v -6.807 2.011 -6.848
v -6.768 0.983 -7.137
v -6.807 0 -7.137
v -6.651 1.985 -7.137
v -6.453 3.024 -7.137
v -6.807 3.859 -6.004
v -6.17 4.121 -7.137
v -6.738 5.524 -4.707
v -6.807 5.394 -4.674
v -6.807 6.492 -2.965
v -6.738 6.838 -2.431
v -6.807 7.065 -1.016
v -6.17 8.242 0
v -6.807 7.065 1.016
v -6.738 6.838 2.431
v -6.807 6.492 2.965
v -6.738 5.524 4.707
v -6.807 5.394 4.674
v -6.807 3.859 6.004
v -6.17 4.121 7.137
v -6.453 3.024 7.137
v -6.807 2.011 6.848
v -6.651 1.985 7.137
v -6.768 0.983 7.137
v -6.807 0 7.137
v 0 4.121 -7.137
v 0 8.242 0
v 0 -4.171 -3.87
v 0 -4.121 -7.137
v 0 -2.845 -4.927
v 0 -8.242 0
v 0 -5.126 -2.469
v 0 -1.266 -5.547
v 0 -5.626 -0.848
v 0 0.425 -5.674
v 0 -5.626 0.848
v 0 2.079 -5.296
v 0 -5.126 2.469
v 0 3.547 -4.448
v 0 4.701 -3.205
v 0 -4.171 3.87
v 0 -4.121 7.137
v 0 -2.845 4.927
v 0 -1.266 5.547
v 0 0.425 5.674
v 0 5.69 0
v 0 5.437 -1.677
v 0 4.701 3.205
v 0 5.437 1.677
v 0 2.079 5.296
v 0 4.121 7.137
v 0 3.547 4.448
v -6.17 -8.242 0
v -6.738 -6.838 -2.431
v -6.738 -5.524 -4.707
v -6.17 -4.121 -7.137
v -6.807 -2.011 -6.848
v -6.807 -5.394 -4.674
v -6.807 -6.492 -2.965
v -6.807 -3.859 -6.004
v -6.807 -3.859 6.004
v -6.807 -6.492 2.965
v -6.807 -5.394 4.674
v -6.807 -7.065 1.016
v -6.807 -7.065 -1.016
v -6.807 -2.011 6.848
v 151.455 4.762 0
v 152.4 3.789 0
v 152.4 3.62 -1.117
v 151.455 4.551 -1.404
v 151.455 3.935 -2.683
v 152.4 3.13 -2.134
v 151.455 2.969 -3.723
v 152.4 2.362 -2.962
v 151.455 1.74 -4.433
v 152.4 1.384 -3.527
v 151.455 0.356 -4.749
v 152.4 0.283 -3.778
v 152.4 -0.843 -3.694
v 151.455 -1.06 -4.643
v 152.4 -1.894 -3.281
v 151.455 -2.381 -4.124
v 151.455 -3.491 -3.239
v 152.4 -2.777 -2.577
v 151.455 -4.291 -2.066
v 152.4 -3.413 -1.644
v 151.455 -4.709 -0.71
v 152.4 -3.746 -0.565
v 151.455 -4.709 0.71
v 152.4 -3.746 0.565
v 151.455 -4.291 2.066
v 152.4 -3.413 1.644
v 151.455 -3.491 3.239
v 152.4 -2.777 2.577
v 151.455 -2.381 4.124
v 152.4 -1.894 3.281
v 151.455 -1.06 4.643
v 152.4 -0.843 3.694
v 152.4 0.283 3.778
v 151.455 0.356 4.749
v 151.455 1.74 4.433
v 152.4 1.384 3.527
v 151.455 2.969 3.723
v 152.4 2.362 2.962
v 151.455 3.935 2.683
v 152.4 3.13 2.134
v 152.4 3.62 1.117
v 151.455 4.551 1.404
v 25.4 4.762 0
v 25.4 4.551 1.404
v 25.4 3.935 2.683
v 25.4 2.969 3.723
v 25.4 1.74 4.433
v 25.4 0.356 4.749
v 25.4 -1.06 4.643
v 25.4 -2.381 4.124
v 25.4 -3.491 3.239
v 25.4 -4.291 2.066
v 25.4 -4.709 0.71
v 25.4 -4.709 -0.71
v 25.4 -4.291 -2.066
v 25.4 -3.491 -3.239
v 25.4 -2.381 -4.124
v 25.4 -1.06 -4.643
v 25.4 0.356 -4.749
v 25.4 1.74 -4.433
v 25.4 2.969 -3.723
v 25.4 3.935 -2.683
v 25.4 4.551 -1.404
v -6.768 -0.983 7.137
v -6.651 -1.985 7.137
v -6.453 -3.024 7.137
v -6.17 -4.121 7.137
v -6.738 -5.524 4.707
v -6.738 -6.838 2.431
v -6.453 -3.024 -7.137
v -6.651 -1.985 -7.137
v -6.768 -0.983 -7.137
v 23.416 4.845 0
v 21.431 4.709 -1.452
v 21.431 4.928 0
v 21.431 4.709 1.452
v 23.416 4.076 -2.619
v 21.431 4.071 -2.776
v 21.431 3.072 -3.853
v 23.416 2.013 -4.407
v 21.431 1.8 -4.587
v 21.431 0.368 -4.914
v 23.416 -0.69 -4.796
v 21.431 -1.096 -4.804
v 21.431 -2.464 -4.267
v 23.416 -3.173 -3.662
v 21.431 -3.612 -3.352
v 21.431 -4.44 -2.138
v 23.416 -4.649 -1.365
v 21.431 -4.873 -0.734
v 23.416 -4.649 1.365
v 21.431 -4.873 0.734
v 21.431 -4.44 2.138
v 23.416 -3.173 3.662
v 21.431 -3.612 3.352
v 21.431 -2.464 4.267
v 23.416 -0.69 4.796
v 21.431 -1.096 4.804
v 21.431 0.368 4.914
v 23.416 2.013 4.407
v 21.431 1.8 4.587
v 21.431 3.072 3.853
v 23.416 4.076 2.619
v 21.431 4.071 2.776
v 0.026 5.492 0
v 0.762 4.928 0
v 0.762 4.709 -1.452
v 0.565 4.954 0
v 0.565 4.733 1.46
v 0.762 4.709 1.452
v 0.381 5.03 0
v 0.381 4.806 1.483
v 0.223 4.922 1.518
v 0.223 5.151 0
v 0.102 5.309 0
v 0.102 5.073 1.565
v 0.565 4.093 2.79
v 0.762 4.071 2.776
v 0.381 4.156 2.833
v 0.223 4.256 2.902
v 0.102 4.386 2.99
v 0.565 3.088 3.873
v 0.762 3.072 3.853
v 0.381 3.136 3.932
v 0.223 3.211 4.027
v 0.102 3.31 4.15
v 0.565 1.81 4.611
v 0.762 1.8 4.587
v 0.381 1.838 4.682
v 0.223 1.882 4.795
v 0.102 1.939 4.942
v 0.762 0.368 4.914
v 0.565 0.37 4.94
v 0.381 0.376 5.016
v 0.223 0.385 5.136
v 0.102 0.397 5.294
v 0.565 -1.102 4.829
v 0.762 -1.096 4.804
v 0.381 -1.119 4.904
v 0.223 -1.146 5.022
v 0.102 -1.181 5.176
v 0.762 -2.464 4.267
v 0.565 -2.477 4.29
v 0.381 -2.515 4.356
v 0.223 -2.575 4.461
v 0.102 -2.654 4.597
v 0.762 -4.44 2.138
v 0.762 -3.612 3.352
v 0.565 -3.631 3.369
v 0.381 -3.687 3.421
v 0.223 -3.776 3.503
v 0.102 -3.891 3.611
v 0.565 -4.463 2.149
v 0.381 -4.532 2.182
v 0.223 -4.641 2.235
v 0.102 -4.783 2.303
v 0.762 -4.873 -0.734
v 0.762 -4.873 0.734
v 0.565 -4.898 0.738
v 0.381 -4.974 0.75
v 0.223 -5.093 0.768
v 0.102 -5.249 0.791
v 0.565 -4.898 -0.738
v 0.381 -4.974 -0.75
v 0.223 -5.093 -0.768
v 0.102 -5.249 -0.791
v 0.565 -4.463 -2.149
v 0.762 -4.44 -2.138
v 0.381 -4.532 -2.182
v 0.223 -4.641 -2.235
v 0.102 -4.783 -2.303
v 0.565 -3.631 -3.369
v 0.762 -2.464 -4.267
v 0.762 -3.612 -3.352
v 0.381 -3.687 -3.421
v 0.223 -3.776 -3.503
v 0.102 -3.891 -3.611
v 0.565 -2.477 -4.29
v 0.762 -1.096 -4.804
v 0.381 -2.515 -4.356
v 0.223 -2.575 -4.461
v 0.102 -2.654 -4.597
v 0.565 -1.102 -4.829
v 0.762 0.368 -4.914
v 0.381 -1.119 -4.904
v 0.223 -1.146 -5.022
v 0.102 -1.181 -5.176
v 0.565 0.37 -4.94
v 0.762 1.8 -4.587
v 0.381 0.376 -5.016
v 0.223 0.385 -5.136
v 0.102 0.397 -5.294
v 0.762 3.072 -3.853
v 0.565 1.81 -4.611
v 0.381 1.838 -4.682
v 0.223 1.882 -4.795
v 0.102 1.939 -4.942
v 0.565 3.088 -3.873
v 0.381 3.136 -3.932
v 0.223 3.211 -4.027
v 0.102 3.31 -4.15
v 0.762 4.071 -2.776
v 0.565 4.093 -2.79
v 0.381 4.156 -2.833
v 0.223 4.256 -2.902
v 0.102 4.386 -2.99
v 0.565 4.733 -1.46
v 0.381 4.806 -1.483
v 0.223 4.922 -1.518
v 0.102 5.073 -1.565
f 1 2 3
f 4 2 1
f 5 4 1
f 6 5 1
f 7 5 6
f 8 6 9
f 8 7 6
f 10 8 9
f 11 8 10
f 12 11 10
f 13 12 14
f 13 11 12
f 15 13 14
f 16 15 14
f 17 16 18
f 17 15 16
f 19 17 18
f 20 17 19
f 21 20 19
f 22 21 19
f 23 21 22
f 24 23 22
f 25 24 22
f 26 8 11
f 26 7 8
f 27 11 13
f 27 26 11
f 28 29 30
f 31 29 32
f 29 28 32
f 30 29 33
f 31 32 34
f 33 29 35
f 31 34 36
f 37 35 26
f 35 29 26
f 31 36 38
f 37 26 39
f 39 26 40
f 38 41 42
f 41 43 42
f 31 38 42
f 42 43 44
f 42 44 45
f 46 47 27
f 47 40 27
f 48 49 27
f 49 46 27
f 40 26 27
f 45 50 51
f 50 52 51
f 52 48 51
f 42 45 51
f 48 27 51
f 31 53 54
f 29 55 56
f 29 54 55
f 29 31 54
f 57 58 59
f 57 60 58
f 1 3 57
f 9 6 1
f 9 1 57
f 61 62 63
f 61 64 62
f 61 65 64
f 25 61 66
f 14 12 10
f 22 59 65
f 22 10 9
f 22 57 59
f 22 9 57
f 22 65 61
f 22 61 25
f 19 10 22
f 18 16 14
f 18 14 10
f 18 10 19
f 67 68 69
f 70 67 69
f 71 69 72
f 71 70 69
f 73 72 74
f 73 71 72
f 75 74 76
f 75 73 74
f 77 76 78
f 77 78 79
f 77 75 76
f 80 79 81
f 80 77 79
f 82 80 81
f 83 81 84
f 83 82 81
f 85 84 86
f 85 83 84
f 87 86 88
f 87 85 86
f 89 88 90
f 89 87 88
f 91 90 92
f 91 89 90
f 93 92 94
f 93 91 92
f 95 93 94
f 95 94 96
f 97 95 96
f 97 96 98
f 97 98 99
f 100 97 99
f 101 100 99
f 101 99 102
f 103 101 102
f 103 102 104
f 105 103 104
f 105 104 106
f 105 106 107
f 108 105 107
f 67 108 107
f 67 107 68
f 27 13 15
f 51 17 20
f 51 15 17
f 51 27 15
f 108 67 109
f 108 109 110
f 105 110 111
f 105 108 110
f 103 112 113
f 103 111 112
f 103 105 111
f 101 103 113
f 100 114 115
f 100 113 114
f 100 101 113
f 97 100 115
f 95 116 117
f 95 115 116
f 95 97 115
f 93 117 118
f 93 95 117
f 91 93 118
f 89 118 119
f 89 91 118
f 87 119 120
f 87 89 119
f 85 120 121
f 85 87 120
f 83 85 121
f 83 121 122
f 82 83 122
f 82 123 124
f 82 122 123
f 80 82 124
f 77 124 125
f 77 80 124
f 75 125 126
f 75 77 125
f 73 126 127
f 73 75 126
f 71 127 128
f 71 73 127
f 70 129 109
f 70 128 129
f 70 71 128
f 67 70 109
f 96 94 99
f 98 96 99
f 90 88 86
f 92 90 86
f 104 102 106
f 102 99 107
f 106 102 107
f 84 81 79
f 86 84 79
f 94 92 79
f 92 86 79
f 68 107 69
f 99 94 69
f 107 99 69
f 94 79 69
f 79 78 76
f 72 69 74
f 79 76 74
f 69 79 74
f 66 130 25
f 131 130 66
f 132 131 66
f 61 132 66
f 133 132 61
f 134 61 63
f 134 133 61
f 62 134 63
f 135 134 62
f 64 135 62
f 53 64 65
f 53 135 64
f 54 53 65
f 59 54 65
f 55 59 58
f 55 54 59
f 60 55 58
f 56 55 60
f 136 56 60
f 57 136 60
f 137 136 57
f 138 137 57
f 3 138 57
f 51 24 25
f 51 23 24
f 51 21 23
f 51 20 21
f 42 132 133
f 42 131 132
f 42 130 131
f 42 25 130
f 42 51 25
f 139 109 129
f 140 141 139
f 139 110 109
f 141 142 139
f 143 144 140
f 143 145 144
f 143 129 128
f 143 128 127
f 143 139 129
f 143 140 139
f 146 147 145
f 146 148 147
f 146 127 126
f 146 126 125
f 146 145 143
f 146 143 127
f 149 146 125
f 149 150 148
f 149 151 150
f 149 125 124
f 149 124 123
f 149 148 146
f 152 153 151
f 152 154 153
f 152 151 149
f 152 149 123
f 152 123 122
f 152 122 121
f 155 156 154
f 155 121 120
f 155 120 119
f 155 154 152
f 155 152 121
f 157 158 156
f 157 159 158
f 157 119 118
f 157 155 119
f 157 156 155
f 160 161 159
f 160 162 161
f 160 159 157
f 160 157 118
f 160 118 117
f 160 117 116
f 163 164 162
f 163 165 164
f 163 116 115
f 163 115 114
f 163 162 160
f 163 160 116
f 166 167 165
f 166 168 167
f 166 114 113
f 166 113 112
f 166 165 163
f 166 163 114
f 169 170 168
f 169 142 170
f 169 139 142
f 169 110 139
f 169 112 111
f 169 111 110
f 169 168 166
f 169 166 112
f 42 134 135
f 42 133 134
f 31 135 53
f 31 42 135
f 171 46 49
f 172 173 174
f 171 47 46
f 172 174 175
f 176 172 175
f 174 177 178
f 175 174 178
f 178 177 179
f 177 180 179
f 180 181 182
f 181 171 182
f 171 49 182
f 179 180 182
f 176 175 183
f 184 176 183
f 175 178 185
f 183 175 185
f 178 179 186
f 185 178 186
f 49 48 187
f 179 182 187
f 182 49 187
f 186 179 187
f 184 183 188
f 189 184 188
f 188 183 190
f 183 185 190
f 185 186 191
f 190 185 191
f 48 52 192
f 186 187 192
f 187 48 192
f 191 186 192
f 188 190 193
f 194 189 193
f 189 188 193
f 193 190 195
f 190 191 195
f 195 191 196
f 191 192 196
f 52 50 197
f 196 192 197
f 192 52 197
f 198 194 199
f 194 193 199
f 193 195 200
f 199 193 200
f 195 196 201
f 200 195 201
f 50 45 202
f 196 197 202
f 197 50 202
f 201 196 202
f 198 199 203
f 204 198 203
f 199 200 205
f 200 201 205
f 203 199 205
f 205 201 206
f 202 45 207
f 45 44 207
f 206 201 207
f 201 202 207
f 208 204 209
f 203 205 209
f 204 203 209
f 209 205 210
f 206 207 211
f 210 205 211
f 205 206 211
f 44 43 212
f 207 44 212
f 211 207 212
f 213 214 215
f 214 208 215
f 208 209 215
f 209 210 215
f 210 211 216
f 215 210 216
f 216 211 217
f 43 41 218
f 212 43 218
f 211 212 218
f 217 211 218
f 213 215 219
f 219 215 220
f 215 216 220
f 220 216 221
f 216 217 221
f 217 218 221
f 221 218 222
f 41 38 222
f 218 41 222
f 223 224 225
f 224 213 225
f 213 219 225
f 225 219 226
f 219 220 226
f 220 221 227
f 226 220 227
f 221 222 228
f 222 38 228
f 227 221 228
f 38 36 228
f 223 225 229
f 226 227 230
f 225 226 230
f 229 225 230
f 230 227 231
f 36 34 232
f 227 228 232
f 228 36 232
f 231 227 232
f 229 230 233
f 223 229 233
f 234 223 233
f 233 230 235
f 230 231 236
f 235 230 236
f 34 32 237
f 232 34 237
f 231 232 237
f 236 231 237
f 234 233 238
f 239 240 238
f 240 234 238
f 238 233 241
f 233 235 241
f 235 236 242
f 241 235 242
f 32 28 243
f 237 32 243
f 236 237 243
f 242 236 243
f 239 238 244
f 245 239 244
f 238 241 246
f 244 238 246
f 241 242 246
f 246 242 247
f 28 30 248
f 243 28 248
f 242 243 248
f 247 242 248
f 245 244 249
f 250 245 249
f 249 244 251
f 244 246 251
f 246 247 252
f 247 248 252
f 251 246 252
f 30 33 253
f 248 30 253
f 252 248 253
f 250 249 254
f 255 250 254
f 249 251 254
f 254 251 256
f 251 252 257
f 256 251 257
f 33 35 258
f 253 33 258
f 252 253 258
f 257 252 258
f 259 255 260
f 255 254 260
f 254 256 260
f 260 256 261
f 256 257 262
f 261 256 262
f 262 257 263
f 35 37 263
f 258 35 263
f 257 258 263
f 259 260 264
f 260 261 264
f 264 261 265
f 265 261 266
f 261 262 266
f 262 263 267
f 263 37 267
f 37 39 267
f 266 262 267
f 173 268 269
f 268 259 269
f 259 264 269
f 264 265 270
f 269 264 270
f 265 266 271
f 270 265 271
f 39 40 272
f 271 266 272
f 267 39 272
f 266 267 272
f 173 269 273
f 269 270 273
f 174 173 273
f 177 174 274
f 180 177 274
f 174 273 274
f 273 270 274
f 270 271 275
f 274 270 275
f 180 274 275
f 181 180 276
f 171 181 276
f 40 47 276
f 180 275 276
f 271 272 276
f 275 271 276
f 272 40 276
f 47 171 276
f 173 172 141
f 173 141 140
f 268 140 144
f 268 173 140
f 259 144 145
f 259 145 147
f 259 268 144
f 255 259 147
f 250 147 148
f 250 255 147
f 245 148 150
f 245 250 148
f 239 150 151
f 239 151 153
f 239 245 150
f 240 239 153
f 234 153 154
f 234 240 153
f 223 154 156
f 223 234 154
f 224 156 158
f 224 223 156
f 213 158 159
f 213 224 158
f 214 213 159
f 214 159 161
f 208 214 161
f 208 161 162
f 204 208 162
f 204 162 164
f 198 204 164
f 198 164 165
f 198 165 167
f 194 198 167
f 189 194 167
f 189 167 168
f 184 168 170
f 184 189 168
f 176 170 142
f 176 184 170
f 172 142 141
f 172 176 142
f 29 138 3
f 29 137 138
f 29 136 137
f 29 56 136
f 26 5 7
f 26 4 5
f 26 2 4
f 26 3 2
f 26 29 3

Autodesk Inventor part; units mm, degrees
ref_plane "YZ Plane" through (0, 0, 0) normal (1, 0, 0) x (0, 1, 0)
ref_plane "XZ Plane" through (0, 0, 0) normal (0, 1, 0) x (-1, 0, 0)
sketch "Sketch1" plane through (0, 0, 0) normal (0, 0, 1) x (1, 0, 0)
  line L0 (0, 7.1374) -> (0, 4.9276)
  line L1 (25.4, 4.7625) -> (152.4, 4.7625)
  line L2 (152.4, 4.7625) -> (152.4, 0)
  line L3 (152.4, 0) -> (-0.0001, 0)
  line L4 (-30.4801, 0) -> (182.88, 0) projected
  line L5 (-0.0001, 0) -> (-0.0001, 7.1374)
  line L6 (-0.0001, 7.1374) -> (0, 7.1374)
  line L7 (25.4, 4.7625) -> (21.4311, 4.9276)
  line L8 (21.4311, 4.9276) -> (0, 4.9276)
  line L9 (0, -1.4275) -> (0, 8.5649) projected
  dimension "d0" = 152.4
  dimension "d1" = 127
revolve "Body" add sketch "Sketch1" angle 360 about axis through (152.4, 0, 0) along (-1, 0, 0)
sketch "Sketch2" plane through (-0.0001, 0, 0) normal (-1, 0, 0) x (0, 0, 1)
  line L0 (0, 8.2416) -> (7.1374, 4.1208)
  line L1 (7.1374, 4.1208) -> (7.1374, -4.1208)
  line L2 (7.1374, -4.1208) -> (0, -8.2416)
  line L3 (0, -8.2416) -> (-7.1374, -4.1208)
  line L4 (-7.1374, -4.1208) -> (-7.1374, 4.1208)
  line L5 (-7.1374, 4.1208) -> (0, 8.2416)
  point P0 (0, 0)
  point P1 (0, 0)
  dimension "d11" = 14.2748
extrude "Head" add sketch "Sketch2" along normal blind 6.8072
sketch "Sketch4" plane through (0, 0, 0) normal (0, 0, 1) x (1, 0, 0)
  line L0 (-6.8073, 7.1374) -> (-6.8073, 8.2416)
  line L1 (-6.8073, 8.2416) -> (-6.1698, 8.2416)
  line L2 (-6.1698, 8.2416) -> (-6.8073, 7.1374)
  line L3 (-8.1687, 0) -> (1.3613, 0) projected
  line L4 (-0.0001, 8.2416) -> (-6.8073, 8.2416) projected
  line L5 (-6.8073, 4.1208) -> (-6.8073, 8.2416) projected
  dimension "d5" = 30
  dimension "d19" = 14.2748
revolve "Chamfer1" cut sketch "Sketch4" angle 360 about axis through (-10, 0, 0) along (1, 0, 0)
thread "Thread" size "3/8-16 UNC" class "2A" standard "ANSI Unified Screw Threads" full length
chamfer "Chamfer2" distance 0.9739 distance2 0.9447 1 edges at (152.4, -4.7625, 0) measured on face at (152.4, -0.1914, 1.3928)
ref_plane "Work Plane1" through (1.525, 0, 0) normal (0, 0, 1) x (1, 0, 0)
fillet "Fillet2" radius 0.762 1 edges at (0, -4.9276, 0)
equation "\"d63\" = R"
equation "\"d11\" = SW"
equation "\"d3\" = KOH - SD"
equation "\"d15\" = GEL"
equation "\"d6\" = -0.5 * SPD + 0.5 * GD"
equation "\"d5\" = ANG1"
equation "\"d19\" = SW0"
equation "\"NLG\" = 190.5"
equation "\"GD\" = NND"
equation "\"BDM\" = 9.8552"
equation "\"KOH\" = 6.8072"
equation "\"GEL\" = 31.75"
equation "\"SW\" = 14.2748"
equation "\"SW0\" = SW"
equation "\"SPD\" = GD1"
equation "\"SD2\" = SW"
equation "\"SD\" = 0"
equation "\"ANG1\" = 30deg"
equation "\"GAL\" = 3.96875"
equation "\"GUL\" = 0.238 * GAL"
equation "\"R\" = 0.762"
equation "\"d62\" = -NLG - SD + GUL"
equation "\"GD1\" = 7.5773"
equation "\"THREADDIA\" = 9.525"
equation "\"TOA\" = 30deg"
equation "\"NND\" = 9.525"
equation "\"E0\" = 1.155 * SW"
properties part number "am-1055" material "Steel, Mild"
